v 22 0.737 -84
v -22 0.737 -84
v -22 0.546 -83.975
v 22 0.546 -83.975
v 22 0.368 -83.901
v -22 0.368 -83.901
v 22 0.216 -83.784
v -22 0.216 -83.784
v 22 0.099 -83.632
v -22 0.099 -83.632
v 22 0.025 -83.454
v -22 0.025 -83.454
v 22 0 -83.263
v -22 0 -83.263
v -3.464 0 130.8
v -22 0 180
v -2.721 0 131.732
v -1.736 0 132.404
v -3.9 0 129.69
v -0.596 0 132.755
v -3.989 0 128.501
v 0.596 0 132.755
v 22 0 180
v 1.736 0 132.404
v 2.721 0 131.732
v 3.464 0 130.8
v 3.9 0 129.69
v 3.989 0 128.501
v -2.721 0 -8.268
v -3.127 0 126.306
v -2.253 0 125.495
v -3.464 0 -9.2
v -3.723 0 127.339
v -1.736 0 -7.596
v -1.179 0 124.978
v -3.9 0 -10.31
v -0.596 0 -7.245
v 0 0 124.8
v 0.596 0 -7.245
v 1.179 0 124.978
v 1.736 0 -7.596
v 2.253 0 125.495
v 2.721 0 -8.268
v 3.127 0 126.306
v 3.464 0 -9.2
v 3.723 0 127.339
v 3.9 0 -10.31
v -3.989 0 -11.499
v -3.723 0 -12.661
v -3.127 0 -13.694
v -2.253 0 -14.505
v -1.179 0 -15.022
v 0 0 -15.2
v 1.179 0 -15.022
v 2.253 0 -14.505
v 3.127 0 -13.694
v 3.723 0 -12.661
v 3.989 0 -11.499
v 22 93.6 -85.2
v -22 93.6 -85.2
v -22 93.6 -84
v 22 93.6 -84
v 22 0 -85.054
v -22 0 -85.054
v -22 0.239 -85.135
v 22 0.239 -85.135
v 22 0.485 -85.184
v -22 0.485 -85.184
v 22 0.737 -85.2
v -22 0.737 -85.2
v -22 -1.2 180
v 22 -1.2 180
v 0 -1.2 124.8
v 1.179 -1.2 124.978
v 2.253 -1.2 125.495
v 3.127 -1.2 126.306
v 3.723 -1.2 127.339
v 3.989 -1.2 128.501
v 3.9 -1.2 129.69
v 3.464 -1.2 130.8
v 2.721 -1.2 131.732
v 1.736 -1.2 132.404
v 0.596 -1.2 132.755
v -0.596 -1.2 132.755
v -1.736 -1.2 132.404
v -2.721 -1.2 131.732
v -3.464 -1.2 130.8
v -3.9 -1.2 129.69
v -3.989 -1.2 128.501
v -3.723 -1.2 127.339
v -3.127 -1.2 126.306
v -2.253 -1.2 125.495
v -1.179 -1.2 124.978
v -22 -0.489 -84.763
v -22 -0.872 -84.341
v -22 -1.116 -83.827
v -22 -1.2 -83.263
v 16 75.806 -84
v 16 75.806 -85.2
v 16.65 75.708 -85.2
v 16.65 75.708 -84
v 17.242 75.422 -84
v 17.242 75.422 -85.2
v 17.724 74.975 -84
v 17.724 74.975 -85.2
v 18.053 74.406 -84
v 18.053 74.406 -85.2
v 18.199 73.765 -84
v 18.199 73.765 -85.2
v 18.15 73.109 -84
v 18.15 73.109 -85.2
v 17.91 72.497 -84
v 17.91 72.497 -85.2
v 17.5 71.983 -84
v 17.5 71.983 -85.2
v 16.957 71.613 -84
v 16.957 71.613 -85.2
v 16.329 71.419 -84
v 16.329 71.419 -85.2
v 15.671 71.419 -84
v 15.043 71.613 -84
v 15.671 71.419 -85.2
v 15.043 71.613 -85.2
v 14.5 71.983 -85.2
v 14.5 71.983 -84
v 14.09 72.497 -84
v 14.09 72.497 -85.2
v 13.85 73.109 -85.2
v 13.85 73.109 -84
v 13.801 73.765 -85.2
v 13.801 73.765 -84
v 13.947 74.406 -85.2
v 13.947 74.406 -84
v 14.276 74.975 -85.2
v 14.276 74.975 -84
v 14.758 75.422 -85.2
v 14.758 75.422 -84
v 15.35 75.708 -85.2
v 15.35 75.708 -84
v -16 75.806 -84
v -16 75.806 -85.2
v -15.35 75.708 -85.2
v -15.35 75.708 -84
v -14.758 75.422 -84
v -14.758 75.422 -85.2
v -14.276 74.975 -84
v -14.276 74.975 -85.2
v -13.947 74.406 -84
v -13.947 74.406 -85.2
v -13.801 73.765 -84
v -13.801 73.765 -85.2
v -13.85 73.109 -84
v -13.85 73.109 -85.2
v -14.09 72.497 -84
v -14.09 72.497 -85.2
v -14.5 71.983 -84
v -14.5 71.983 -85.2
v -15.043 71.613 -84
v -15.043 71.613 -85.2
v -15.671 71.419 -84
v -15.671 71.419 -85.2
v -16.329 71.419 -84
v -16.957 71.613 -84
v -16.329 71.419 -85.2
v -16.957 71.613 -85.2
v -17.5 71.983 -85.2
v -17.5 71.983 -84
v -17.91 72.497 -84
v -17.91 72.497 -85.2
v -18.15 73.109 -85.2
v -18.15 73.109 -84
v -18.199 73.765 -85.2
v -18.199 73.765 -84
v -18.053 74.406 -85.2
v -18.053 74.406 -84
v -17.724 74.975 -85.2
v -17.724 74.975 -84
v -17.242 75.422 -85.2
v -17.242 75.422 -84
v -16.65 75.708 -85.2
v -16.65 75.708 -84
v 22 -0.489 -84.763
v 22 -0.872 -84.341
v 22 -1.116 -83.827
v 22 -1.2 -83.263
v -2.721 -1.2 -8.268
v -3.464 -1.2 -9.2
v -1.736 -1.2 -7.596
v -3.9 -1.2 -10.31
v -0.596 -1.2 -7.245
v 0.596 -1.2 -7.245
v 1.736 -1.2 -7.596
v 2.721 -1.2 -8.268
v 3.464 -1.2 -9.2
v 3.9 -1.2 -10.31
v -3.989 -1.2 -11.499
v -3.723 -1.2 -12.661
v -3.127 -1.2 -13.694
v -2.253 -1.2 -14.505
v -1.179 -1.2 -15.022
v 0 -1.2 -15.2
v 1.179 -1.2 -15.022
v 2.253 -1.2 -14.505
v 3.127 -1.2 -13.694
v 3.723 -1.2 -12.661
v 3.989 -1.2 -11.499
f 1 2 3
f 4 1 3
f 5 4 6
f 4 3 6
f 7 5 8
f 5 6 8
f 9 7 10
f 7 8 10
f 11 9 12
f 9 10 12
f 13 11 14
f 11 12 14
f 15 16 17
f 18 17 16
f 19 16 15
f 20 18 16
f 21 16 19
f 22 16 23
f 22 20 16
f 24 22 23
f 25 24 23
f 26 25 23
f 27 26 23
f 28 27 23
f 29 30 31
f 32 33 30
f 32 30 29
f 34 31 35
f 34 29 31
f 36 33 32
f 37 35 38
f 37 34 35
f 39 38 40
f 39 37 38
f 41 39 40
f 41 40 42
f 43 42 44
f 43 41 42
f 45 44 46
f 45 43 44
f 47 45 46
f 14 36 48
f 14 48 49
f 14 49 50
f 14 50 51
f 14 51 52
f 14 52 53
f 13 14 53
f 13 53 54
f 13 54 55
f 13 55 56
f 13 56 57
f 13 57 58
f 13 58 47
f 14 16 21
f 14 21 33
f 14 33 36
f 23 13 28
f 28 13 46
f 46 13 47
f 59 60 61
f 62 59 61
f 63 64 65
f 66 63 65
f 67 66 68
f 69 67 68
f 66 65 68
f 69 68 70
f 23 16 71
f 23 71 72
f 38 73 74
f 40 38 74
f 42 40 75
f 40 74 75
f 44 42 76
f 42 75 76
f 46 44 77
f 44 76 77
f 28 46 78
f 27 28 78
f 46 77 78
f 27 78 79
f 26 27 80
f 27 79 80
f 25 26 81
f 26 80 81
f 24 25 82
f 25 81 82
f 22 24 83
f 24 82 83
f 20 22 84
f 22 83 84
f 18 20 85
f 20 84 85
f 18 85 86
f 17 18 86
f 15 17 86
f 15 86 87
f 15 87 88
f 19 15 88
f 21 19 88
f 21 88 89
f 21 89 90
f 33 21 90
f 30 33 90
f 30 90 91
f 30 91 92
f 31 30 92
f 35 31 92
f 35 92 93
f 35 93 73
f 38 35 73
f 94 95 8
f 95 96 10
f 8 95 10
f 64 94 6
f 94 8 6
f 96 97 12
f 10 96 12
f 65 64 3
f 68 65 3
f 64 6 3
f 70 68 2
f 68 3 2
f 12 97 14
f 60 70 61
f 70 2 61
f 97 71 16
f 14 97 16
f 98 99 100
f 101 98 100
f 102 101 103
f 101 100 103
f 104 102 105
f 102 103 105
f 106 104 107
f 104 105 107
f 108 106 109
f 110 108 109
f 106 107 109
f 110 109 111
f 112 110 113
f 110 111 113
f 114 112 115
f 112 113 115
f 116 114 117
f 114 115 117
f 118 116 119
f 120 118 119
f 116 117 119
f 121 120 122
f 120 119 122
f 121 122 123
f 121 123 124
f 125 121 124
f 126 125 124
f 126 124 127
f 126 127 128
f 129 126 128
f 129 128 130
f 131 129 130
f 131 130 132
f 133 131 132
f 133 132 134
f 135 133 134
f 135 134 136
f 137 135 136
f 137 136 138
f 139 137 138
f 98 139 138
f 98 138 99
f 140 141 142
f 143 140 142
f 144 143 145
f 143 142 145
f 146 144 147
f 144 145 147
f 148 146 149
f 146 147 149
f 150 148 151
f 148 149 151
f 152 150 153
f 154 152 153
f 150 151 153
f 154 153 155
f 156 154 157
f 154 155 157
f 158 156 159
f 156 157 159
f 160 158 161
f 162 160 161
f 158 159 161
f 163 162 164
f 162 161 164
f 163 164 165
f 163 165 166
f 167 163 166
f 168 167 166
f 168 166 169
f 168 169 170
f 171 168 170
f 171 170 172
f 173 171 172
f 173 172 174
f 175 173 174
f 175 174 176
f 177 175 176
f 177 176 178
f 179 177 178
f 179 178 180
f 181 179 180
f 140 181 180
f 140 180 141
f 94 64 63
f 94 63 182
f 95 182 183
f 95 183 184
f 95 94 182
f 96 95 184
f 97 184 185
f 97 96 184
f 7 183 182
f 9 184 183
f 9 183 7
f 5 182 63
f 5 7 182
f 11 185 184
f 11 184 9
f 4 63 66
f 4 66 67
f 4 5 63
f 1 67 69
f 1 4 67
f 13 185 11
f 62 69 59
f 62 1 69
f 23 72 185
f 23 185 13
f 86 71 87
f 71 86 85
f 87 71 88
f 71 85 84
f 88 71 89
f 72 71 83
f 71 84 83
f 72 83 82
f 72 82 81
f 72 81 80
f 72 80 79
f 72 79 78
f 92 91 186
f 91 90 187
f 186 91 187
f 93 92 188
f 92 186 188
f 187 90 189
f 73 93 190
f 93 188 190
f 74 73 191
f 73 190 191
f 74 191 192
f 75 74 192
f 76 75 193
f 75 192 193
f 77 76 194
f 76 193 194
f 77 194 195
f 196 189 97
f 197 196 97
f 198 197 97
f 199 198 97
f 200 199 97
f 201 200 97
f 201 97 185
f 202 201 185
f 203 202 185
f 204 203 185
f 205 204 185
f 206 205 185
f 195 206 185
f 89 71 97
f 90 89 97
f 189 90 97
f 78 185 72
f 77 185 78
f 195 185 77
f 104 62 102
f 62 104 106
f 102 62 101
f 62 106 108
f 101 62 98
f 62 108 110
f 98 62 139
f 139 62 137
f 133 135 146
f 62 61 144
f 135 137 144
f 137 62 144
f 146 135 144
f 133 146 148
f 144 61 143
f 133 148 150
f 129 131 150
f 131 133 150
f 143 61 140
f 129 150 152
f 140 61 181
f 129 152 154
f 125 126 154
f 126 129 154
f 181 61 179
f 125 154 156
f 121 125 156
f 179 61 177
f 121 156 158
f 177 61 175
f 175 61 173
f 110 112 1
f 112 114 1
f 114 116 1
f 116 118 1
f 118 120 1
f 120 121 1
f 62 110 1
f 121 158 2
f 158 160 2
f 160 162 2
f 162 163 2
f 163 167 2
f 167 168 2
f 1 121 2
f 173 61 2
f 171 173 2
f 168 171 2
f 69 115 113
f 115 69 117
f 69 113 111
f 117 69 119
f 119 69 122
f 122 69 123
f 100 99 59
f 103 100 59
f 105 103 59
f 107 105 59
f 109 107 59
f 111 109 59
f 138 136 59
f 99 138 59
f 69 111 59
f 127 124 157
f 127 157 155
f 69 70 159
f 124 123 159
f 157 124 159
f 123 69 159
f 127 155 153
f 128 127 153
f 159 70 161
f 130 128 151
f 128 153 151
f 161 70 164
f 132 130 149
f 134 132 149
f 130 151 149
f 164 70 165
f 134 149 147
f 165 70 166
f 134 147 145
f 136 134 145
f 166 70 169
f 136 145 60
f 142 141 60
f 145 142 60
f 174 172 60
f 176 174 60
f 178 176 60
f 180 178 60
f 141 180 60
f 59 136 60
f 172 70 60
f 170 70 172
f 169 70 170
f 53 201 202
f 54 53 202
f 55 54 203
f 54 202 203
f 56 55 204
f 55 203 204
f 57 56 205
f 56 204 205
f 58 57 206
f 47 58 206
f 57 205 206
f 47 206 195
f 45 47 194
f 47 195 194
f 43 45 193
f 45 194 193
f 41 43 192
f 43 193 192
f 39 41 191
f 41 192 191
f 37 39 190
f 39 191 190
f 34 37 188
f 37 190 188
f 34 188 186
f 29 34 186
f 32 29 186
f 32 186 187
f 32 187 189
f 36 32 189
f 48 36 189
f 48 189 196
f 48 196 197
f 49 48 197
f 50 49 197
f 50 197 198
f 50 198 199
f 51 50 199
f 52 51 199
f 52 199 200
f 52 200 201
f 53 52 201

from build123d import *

# Parameters (mm, degrees)
SKETCH1_W              = 44
SKETCH1_H              = 360
BASE_FLANGE1_DEPTH     = 1.2
SKETCHED_START         = -22
SKETCHED_BEND1_DEPTH   = 44
SKETCHED_BEND1_2_DEPTH = 44
SKETCH7_R              = 2.205641569
CUT_EXTRUDE1_DEPTH     = 10
SKETCH8_R              = 4
CUT_EXTRUDE2_DEPTH     = 10


# Read off the part's stored shape, not the designer's step: Sketched Bend1
# Sheet-metal steps are written as plain solids
with BuildPart() as part:
    # Sketch1 → Base-Flange1 (new body)
    with BuildSketch(Plane(origin=(0, 0, 0), x_dir=(1, 0, 0), z_dir=(0, 1, 0))):
        Rectangle(SKETCH1_W, SKETCH1_H)
    extrude(amount=-BASE_FLANGE1_DEPTH)

    # Sketched Bend1 outline → Sketched Bend1 (cut)
    with BuildSketch(Plane.YZ.offset(SKETCHED_START)):
        with BuildLine():
            Line((0, -180), (0, -85.054444388))
            ThreePointArc((0, -85.054444388), (-0.872269031, -84.341342484), (-1.2, -83.2634))
            Line((-1.2, -83.2634), (-1.2, -180))
            Line((-1.2, -180), (0, -180))
        make_face()
    extrude(amount=SKETCHED_BEND1_DEPTH, mode=Mode.SUBTRACT)

    # Sketched Bend1 2 outline → Sketched Bend1 2 (add)
    with BuildSketch(Plane.YZ.offset(SKETCHED_START)):
        with BuildLine():
            Line((93.6, -84), (0.7366, -84))
            ThreePointArc((0.7366, -84), (0.215745145, -83.784254855), (0, -83.2634))
            Line((0, -83.2634), (0, -85.054444388))
            ThreePointArc((0, -85.054444388), (0.361178238, -85.163262642), (0.7366, -85.2))
            Line((0.7366, -85.2), (93.6, -85.2))
            Line((93.6, -85.2), (93.6, -84))
        make_face()
    extrude(amount=SKETCHED_BEND1_2_DEPTH)

    # Sketch7 → Cut-Extrude1 (cut)
    with BuildSketch(Plane(origin=(0, 0, -85.2), x_dir=(-1, 0, 0), z_dir=(0, 0, -1))):
        with Locations(Location((-16, 73.6, 0), (0, 0, 90))):
            Circle(SKETCH7_R)
        with Locations(Location((16, 73.6, 0), (0, 0, 90))):
            Circle(SKETCH7_R)
    extrude(amount=-CUT_EXTRUDE1_DEPTH, mode=Mode.SUBTRACT)

    # Sketch8 → Cut-Extrude2 (cut)
    with BuildSketch(Plane.XZ.offset(1.2)):
        with Locations(Location((0, -11.2, 0), (0, 0, 270))):
            Circle(SKETCH8_R)
        with Locations(Location((0, 128.8, 0), (0, 0, 270))):
            Circle(SKETCH8_R)
    extrude(amount=-CUT_EXTRUDE2_DEPTH, mode=Mode.SUBTRACT)


solid = part.part
